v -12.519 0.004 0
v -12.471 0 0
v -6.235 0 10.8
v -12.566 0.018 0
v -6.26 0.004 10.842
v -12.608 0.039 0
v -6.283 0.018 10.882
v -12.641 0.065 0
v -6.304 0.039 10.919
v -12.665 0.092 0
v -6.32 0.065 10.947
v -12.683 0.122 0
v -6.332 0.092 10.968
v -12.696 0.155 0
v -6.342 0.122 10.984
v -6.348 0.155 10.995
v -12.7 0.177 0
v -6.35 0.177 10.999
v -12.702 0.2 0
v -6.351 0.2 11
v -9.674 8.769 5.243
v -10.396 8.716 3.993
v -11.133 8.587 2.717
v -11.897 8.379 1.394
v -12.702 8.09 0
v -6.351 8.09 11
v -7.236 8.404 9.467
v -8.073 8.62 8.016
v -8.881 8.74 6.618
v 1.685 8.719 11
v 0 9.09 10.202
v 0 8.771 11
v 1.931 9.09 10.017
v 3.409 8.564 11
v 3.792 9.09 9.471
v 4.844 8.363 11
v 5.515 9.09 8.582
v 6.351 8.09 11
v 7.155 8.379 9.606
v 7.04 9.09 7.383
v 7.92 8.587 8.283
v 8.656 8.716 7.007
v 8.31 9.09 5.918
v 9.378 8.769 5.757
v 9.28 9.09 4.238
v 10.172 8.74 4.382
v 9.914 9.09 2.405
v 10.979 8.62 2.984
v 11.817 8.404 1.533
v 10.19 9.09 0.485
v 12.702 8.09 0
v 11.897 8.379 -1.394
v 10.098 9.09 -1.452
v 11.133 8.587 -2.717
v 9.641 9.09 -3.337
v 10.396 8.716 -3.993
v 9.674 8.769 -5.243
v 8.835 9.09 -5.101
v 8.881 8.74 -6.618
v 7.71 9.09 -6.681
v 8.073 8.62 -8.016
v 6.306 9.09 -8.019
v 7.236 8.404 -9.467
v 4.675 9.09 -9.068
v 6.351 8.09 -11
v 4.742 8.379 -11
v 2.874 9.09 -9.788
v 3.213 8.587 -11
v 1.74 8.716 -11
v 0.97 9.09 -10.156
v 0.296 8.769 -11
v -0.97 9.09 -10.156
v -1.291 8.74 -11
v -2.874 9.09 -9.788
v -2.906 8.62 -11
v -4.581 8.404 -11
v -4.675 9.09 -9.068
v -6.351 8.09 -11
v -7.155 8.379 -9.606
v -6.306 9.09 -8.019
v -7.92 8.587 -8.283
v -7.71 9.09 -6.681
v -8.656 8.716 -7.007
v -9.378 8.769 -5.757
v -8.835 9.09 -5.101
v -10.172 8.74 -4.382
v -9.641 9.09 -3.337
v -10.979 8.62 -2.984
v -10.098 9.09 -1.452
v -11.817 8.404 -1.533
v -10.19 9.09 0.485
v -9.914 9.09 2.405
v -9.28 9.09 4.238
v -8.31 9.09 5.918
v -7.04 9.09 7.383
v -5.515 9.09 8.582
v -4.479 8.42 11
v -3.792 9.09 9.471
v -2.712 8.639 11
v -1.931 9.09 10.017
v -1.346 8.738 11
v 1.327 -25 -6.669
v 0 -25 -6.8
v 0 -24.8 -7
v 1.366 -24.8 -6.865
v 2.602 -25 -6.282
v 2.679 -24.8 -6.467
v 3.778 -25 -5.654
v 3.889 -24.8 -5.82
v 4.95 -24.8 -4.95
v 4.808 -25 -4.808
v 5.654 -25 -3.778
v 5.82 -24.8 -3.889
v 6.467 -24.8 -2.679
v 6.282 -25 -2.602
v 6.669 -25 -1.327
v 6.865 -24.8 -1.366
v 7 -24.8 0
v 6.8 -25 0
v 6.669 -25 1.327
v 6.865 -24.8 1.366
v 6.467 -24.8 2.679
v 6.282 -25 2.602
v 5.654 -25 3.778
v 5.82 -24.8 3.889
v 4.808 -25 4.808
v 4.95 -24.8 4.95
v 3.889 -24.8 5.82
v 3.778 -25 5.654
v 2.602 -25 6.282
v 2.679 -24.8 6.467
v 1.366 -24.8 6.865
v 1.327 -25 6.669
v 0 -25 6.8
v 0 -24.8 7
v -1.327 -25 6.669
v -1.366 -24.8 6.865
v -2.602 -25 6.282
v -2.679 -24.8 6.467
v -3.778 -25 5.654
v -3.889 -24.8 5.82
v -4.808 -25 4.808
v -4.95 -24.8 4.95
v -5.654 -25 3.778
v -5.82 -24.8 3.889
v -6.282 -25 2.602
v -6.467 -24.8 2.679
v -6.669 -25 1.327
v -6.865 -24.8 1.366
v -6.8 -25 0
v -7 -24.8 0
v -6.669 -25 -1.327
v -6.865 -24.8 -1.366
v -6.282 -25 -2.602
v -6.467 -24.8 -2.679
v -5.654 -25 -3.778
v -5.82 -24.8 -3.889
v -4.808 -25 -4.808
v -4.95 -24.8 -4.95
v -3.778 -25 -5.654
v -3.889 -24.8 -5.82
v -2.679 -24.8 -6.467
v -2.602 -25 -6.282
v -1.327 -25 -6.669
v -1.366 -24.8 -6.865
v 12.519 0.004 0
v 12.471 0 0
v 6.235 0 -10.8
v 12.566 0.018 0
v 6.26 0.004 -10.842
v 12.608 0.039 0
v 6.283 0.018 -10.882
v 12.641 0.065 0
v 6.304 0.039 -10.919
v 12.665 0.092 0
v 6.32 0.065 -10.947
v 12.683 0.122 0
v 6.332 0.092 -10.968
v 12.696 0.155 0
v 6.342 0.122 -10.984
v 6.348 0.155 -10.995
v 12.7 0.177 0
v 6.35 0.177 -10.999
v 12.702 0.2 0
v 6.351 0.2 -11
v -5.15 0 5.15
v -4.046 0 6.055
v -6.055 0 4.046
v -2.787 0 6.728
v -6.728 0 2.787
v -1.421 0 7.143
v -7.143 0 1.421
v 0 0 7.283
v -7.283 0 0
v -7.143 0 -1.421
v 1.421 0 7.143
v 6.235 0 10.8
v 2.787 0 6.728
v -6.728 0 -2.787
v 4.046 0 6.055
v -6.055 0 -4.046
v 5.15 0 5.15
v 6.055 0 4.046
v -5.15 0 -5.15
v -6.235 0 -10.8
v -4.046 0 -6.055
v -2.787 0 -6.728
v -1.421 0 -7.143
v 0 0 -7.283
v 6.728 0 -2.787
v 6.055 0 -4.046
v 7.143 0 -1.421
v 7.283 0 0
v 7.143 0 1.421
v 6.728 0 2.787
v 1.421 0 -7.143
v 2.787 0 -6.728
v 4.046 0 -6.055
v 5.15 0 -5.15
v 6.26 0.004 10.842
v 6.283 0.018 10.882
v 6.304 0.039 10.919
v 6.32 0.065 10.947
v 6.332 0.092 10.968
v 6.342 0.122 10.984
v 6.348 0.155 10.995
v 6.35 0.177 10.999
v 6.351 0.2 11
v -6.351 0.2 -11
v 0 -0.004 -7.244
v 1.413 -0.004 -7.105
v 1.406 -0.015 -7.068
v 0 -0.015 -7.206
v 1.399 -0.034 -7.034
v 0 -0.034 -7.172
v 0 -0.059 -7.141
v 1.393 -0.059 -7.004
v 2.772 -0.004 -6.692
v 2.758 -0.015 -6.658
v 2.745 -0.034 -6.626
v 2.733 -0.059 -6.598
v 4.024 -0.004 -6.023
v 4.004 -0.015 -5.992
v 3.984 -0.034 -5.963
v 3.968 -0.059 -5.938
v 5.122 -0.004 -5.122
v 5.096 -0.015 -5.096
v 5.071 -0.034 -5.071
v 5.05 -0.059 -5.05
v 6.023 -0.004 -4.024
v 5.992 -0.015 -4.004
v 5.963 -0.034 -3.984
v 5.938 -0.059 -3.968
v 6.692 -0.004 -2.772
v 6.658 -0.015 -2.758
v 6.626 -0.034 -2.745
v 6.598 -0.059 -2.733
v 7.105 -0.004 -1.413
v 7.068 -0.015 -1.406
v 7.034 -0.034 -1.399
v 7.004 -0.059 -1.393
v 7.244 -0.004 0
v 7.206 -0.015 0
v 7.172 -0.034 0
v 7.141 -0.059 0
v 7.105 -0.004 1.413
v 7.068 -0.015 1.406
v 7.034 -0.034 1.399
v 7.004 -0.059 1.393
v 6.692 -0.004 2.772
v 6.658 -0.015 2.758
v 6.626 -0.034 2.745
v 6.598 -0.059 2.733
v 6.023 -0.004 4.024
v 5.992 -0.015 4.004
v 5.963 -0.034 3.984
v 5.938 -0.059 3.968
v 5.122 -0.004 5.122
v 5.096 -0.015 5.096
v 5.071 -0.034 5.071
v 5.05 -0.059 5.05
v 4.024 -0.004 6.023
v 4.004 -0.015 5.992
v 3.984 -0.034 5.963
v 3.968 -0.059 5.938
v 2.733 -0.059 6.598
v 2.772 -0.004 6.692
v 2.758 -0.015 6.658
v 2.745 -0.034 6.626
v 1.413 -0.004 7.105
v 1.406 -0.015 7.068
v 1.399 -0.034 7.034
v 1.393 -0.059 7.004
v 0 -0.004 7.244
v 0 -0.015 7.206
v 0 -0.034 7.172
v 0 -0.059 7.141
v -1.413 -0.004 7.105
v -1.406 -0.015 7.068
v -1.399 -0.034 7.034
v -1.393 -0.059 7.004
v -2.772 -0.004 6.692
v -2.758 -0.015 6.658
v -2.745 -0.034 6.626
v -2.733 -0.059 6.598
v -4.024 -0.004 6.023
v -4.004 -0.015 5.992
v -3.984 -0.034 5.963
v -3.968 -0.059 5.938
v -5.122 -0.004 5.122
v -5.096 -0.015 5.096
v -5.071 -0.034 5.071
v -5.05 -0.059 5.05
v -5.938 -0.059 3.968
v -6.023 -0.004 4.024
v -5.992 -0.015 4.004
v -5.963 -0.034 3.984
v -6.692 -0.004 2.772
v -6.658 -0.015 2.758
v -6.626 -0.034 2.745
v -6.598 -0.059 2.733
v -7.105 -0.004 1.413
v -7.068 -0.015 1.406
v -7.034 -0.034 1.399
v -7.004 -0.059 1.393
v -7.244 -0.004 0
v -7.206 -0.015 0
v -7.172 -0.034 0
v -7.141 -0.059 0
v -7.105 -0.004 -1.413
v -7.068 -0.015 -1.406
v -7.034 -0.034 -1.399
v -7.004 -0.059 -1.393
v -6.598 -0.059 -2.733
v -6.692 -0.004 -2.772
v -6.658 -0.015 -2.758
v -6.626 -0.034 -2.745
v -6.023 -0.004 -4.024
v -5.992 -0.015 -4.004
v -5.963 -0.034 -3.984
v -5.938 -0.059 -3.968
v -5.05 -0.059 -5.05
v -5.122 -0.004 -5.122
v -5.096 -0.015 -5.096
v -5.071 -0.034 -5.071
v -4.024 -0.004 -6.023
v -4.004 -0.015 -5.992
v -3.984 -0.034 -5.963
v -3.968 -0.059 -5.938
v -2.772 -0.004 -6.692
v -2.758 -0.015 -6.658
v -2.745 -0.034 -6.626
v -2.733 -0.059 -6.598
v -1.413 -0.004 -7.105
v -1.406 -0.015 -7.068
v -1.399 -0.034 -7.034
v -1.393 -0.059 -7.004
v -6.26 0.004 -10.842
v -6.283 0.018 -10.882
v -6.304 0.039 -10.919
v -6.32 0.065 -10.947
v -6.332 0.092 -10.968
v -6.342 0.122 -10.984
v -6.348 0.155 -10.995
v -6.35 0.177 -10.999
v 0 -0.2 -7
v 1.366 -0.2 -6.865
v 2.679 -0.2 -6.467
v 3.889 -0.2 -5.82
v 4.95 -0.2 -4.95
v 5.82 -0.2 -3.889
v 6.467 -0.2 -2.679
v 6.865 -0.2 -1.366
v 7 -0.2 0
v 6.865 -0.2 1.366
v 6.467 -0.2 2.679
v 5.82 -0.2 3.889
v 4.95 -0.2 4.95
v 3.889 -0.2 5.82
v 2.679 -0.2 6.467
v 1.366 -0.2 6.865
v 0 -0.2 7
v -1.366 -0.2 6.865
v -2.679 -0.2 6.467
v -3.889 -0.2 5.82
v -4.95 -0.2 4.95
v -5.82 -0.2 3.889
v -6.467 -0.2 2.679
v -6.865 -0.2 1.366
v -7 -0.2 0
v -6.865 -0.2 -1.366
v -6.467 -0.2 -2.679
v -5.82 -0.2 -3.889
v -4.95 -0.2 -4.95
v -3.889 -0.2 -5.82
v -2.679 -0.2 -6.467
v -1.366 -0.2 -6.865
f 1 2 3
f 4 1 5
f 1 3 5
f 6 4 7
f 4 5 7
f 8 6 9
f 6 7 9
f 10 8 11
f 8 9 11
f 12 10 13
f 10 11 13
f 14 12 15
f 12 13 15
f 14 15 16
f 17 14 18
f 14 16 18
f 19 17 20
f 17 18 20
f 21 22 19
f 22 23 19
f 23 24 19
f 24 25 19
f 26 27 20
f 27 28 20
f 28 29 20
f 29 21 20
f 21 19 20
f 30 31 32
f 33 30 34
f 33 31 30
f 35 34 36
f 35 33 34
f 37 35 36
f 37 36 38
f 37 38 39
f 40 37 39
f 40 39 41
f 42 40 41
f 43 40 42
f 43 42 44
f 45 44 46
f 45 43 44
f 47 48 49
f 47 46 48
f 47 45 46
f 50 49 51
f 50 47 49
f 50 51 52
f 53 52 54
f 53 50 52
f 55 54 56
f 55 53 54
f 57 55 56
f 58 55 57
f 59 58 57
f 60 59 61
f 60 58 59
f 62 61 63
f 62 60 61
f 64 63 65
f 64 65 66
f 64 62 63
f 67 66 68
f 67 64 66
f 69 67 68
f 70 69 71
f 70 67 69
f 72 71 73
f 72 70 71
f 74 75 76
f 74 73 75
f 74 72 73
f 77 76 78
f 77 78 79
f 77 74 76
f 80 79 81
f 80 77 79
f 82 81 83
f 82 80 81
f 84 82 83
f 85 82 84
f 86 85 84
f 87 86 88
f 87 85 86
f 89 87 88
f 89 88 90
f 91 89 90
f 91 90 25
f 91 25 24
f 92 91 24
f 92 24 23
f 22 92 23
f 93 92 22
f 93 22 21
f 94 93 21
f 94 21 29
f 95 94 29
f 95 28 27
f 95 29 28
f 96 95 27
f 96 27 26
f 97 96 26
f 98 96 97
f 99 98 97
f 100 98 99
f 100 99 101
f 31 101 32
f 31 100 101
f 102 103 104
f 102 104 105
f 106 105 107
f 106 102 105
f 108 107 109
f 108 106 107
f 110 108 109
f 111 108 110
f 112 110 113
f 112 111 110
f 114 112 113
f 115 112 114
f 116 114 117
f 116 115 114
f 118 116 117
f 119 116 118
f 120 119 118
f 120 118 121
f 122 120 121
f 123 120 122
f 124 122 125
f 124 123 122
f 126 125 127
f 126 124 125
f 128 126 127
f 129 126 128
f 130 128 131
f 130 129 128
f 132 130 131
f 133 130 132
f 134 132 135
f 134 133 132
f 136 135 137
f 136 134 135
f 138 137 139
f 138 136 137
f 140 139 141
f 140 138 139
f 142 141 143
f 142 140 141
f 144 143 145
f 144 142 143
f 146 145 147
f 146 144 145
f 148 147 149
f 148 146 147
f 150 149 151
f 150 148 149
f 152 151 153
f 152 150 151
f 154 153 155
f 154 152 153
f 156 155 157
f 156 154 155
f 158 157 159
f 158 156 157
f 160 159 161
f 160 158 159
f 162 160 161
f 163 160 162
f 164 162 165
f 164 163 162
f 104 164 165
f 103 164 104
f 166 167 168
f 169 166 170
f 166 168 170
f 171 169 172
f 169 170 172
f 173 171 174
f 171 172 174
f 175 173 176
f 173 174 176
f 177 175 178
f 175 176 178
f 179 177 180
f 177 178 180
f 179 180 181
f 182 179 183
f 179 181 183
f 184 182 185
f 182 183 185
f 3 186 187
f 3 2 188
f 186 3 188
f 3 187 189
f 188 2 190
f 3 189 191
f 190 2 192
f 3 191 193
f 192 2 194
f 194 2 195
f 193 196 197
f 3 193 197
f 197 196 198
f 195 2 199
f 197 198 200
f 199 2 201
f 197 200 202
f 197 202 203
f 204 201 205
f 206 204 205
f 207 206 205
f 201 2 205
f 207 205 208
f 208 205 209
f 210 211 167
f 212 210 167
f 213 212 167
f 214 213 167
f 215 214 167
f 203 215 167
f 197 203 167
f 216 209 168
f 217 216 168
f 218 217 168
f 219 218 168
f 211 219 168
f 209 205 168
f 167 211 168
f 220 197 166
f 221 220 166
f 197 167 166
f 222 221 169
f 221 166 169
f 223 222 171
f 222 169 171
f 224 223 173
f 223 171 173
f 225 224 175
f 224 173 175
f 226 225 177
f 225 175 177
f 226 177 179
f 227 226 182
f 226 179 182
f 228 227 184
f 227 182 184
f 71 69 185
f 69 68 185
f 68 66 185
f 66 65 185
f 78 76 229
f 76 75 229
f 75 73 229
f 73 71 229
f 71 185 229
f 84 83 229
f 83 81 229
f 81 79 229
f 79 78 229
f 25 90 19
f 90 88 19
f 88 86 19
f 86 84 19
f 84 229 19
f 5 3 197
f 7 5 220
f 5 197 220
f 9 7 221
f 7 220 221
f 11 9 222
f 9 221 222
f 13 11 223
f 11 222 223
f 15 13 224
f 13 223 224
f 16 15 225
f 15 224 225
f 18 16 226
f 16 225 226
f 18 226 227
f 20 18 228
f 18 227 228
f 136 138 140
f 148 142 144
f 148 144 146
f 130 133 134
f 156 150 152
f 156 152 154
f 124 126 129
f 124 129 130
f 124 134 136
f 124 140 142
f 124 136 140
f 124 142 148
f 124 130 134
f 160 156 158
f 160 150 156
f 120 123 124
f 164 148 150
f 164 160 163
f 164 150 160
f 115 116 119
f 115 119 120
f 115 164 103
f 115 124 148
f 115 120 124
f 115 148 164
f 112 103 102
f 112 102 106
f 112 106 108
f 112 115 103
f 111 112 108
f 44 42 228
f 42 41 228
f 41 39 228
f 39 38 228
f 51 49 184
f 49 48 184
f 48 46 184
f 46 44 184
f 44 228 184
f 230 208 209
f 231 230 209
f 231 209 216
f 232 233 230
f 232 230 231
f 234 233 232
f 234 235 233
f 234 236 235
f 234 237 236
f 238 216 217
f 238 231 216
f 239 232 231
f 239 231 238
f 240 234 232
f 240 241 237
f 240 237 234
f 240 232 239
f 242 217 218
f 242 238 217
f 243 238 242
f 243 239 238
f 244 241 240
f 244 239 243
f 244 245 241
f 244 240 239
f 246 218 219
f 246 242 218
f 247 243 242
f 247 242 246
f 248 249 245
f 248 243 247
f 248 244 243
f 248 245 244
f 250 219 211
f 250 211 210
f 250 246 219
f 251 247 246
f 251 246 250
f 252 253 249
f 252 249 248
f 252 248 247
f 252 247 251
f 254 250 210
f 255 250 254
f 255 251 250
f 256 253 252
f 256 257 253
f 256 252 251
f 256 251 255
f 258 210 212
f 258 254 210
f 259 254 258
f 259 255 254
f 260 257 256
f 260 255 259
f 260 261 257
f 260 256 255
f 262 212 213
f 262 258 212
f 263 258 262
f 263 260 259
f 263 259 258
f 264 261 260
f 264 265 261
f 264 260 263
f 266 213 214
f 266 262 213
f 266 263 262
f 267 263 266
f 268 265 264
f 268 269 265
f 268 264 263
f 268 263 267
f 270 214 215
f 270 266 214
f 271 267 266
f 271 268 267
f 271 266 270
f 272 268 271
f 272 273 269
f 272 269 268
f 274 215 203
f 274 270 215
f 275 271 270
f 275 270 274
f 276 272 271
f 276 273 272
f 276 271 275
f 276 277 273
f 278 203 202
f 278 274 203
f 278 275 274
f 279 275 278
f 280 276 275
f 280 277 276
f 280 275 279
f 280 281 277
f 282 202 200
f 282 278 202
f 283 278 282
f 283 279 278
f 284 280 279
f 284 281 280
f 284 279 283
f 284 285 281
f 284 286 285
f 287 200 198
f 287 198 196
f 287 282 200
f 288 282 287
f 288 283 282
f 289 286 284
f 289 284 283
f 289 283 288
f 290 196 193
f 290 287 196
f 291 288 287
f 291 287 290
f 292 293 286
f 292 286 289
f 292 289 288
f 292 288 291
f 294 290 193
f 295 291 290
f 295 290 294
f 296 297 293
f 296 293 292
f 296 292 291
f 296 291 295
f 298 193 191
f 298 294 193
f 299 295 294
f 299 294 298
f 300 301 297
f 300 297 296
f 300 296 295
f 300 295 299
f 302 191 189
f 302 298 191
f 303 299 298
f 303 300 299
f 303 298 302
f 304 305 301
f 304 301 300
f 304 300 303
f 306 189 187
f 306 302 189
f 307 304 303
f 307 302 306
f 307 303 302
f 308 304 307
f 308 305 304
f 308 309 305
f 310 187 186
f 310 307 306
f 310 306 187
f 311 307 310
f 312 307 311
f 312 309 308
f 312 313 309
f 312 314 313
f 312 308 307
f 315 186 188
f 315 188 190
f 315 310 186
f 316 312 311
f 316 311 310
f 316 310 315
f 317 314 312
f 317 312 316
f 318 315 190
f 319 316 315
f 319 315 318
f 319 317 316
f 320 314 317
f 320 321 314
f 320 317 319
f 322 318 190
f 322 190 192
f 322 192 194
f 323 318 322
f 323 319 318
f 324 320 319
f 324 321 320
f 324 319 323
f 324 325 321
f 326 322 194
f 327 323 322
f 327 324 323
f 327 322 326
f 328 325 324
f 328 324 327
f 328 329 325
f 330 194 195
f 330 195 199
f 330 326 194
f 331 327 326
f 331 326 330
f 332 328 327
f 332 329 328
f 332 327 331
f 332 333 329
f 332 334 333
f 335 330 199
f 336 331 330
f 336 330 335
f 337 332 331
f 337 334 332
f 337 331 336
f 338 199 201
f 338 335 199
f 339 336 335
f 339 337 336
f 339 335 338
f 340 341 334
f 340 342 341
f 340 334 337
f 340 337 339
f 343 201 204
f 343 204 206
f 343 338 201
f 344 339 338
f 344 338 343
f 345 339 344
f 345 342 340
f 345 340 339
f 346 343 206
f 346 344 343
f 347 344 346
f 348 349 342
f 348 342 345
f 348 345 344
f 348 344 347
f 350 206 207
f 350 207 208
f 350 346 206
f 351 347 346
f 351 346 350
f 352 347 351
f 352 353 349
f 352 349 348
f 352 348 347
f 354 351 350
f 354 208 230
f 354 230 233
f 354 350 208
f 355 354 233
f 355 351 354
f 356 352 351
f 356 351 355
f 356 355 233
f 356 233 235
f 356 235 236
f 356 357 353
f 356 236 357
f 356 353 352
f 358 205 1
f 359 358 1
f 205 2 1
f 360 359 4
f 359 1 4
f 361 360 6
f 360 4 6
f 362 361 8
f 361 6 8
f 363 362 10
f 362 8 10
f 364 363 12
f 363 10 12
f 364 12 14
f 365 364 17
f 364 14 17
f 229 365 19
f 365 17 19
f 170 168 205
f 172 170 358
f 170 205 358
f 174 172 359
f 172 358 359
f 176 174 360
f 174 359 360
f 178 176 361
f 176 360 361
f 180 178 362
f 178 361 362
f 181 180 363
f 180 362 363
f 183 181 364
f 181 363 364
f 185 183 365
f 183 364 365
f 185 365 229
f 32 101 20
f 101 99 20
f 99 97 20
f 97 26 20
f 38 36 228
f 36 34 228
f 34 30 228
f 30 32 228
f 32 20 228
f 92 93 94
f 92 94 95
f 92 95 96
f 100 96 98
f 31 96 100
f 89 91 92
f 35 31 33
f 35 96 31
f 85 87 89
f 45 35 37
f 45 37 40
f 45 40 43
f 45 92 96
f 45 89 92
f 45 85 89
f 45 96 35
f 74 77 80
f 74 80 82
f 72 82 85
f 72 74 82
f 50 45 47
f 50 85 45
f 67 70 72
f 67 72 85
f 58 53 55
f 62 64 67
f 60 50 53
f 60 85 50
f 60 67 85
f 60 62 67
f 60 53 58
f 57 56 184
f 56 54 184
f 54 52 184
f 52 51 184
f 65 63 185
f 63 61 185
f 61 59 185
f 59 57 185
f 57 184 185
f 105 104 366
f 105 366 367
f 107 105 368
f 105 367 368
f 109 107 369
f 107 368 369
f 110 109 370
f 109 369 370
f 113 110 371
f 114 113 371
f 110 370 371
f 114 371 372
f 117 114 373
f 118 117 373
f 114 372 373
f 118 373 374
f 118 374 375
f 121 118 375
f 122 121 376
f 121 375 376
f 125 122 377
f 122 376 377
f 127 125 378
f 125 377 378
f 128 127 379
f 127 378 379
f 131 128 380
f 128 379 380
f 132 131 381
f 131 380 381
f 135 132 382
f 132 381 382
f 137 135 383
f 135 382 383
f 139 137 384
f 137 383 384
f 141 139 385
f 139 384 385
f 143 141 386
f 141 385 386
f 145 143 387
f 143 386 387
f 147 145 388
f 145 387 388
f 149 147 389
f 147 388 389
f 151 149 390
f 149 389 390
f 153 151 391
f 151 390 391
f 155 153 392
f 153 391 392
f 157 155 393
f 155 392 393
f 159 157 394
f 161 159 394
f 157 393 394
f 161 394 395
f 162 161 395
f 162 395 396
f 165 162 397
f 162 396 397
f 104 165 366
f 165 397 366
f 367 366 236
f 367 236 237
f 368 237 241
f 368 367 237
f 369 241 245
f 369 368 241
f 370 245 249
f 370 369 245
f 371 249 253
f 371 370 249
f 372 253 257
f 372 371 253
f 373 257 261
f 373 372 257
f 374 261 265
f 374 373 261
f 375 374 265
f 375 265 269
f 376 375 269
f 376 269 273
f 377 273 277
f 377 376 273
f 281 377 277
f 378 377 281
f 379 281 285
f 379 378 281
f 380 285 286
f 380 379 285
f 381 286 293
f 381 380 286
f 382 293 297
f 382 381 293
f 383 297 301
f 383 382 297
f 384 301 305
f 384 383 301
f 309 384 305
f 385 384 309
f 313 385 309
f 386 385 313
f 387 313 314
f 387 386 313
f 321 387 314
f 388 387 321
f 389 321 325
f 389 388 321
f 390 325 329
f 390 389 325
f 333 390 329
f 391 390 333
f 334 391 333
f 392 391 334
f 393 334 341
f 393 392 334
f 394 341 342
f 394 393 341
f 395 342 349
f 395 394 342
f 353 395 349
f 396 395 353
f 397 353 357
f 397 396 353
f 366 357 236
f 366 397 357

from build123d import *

# Parameters (mm, degrees)
EXTRUDE_1_DEPTH = 9.09
SKETCH_2_R      = 7
EXTRUDE_2_DEPTH = 25
CHAMFER_1_SIZE  = 0.2
FILLET_1_R      = 0.2


with BuildPart() as part:
    # 草图1 → 凸台-拉伸1 (new body)
    with BuildSketch(Plane(origin=(0, 0, 0), x_dir=(1, 0, 0), z_dir=(0, 1, 0))):
        Polygon((12.701705922, 0), (6.350852961, 11), (-6.350852961, 11), (-12.701705922, 0), (-6.350852961, -11), (6.350852961, -11), align=None)
    extrude(amount=EXTRUDE_1_DEPTH)

    # 草图2 → 凸台-拉伸2 (add)
    with BuildSketch(Plane.XZ):
        with Locations(Location((0, 0, 0), (0, 0, 270))):
            Circle(SKETCH_2_R)
    extrude(amount=EXTRUDE_2_DEPTH)

    # 倒角1
    chamfer_1_edges = [part.edges().sort_by_distance(p)[0] for p in [
        (0, 0, 7),
        (0, -25, 7),
    ]]
    chamfer(chamfer_1_edges, length=CHAMFER_1_SIZE)

    # 圆角1
    fillet_1_edges = [part.edges().sort_by_distance(p)[0] for p in [
        (0, 0, 7.2),
        (0, 0, 11),
        (-9.526279442, 0, 5.5),
        (-9.526279442, 0, -5.5),
        (0, 0, -11),
        (9.526279442, 0, -5.5),
        (9.526279442, 0, 5.5),
    ]]
    fillet(fillet_1_edges, radius=FILLET_1_R)

    # 草图3 → 切除-旋转1 (revolve, cut)
    with BuildSketch(Plane.XY, mode=Mode.PRIVATE) as cut_revolve_1_sk:
        Polygon((10.201705922, 9.09), (12.701705922, 9.09), (12.701705922, 8.09), align=None)
    revolve(cut_revolve_1_sk.sketch.rotate(Axis((0, 0, 0), (0, 1, 0)), 270), axis=Axis((0, 0, 0), (0, 1, 0)), mode=Mode.SUBTRACT)


solid = part.part
